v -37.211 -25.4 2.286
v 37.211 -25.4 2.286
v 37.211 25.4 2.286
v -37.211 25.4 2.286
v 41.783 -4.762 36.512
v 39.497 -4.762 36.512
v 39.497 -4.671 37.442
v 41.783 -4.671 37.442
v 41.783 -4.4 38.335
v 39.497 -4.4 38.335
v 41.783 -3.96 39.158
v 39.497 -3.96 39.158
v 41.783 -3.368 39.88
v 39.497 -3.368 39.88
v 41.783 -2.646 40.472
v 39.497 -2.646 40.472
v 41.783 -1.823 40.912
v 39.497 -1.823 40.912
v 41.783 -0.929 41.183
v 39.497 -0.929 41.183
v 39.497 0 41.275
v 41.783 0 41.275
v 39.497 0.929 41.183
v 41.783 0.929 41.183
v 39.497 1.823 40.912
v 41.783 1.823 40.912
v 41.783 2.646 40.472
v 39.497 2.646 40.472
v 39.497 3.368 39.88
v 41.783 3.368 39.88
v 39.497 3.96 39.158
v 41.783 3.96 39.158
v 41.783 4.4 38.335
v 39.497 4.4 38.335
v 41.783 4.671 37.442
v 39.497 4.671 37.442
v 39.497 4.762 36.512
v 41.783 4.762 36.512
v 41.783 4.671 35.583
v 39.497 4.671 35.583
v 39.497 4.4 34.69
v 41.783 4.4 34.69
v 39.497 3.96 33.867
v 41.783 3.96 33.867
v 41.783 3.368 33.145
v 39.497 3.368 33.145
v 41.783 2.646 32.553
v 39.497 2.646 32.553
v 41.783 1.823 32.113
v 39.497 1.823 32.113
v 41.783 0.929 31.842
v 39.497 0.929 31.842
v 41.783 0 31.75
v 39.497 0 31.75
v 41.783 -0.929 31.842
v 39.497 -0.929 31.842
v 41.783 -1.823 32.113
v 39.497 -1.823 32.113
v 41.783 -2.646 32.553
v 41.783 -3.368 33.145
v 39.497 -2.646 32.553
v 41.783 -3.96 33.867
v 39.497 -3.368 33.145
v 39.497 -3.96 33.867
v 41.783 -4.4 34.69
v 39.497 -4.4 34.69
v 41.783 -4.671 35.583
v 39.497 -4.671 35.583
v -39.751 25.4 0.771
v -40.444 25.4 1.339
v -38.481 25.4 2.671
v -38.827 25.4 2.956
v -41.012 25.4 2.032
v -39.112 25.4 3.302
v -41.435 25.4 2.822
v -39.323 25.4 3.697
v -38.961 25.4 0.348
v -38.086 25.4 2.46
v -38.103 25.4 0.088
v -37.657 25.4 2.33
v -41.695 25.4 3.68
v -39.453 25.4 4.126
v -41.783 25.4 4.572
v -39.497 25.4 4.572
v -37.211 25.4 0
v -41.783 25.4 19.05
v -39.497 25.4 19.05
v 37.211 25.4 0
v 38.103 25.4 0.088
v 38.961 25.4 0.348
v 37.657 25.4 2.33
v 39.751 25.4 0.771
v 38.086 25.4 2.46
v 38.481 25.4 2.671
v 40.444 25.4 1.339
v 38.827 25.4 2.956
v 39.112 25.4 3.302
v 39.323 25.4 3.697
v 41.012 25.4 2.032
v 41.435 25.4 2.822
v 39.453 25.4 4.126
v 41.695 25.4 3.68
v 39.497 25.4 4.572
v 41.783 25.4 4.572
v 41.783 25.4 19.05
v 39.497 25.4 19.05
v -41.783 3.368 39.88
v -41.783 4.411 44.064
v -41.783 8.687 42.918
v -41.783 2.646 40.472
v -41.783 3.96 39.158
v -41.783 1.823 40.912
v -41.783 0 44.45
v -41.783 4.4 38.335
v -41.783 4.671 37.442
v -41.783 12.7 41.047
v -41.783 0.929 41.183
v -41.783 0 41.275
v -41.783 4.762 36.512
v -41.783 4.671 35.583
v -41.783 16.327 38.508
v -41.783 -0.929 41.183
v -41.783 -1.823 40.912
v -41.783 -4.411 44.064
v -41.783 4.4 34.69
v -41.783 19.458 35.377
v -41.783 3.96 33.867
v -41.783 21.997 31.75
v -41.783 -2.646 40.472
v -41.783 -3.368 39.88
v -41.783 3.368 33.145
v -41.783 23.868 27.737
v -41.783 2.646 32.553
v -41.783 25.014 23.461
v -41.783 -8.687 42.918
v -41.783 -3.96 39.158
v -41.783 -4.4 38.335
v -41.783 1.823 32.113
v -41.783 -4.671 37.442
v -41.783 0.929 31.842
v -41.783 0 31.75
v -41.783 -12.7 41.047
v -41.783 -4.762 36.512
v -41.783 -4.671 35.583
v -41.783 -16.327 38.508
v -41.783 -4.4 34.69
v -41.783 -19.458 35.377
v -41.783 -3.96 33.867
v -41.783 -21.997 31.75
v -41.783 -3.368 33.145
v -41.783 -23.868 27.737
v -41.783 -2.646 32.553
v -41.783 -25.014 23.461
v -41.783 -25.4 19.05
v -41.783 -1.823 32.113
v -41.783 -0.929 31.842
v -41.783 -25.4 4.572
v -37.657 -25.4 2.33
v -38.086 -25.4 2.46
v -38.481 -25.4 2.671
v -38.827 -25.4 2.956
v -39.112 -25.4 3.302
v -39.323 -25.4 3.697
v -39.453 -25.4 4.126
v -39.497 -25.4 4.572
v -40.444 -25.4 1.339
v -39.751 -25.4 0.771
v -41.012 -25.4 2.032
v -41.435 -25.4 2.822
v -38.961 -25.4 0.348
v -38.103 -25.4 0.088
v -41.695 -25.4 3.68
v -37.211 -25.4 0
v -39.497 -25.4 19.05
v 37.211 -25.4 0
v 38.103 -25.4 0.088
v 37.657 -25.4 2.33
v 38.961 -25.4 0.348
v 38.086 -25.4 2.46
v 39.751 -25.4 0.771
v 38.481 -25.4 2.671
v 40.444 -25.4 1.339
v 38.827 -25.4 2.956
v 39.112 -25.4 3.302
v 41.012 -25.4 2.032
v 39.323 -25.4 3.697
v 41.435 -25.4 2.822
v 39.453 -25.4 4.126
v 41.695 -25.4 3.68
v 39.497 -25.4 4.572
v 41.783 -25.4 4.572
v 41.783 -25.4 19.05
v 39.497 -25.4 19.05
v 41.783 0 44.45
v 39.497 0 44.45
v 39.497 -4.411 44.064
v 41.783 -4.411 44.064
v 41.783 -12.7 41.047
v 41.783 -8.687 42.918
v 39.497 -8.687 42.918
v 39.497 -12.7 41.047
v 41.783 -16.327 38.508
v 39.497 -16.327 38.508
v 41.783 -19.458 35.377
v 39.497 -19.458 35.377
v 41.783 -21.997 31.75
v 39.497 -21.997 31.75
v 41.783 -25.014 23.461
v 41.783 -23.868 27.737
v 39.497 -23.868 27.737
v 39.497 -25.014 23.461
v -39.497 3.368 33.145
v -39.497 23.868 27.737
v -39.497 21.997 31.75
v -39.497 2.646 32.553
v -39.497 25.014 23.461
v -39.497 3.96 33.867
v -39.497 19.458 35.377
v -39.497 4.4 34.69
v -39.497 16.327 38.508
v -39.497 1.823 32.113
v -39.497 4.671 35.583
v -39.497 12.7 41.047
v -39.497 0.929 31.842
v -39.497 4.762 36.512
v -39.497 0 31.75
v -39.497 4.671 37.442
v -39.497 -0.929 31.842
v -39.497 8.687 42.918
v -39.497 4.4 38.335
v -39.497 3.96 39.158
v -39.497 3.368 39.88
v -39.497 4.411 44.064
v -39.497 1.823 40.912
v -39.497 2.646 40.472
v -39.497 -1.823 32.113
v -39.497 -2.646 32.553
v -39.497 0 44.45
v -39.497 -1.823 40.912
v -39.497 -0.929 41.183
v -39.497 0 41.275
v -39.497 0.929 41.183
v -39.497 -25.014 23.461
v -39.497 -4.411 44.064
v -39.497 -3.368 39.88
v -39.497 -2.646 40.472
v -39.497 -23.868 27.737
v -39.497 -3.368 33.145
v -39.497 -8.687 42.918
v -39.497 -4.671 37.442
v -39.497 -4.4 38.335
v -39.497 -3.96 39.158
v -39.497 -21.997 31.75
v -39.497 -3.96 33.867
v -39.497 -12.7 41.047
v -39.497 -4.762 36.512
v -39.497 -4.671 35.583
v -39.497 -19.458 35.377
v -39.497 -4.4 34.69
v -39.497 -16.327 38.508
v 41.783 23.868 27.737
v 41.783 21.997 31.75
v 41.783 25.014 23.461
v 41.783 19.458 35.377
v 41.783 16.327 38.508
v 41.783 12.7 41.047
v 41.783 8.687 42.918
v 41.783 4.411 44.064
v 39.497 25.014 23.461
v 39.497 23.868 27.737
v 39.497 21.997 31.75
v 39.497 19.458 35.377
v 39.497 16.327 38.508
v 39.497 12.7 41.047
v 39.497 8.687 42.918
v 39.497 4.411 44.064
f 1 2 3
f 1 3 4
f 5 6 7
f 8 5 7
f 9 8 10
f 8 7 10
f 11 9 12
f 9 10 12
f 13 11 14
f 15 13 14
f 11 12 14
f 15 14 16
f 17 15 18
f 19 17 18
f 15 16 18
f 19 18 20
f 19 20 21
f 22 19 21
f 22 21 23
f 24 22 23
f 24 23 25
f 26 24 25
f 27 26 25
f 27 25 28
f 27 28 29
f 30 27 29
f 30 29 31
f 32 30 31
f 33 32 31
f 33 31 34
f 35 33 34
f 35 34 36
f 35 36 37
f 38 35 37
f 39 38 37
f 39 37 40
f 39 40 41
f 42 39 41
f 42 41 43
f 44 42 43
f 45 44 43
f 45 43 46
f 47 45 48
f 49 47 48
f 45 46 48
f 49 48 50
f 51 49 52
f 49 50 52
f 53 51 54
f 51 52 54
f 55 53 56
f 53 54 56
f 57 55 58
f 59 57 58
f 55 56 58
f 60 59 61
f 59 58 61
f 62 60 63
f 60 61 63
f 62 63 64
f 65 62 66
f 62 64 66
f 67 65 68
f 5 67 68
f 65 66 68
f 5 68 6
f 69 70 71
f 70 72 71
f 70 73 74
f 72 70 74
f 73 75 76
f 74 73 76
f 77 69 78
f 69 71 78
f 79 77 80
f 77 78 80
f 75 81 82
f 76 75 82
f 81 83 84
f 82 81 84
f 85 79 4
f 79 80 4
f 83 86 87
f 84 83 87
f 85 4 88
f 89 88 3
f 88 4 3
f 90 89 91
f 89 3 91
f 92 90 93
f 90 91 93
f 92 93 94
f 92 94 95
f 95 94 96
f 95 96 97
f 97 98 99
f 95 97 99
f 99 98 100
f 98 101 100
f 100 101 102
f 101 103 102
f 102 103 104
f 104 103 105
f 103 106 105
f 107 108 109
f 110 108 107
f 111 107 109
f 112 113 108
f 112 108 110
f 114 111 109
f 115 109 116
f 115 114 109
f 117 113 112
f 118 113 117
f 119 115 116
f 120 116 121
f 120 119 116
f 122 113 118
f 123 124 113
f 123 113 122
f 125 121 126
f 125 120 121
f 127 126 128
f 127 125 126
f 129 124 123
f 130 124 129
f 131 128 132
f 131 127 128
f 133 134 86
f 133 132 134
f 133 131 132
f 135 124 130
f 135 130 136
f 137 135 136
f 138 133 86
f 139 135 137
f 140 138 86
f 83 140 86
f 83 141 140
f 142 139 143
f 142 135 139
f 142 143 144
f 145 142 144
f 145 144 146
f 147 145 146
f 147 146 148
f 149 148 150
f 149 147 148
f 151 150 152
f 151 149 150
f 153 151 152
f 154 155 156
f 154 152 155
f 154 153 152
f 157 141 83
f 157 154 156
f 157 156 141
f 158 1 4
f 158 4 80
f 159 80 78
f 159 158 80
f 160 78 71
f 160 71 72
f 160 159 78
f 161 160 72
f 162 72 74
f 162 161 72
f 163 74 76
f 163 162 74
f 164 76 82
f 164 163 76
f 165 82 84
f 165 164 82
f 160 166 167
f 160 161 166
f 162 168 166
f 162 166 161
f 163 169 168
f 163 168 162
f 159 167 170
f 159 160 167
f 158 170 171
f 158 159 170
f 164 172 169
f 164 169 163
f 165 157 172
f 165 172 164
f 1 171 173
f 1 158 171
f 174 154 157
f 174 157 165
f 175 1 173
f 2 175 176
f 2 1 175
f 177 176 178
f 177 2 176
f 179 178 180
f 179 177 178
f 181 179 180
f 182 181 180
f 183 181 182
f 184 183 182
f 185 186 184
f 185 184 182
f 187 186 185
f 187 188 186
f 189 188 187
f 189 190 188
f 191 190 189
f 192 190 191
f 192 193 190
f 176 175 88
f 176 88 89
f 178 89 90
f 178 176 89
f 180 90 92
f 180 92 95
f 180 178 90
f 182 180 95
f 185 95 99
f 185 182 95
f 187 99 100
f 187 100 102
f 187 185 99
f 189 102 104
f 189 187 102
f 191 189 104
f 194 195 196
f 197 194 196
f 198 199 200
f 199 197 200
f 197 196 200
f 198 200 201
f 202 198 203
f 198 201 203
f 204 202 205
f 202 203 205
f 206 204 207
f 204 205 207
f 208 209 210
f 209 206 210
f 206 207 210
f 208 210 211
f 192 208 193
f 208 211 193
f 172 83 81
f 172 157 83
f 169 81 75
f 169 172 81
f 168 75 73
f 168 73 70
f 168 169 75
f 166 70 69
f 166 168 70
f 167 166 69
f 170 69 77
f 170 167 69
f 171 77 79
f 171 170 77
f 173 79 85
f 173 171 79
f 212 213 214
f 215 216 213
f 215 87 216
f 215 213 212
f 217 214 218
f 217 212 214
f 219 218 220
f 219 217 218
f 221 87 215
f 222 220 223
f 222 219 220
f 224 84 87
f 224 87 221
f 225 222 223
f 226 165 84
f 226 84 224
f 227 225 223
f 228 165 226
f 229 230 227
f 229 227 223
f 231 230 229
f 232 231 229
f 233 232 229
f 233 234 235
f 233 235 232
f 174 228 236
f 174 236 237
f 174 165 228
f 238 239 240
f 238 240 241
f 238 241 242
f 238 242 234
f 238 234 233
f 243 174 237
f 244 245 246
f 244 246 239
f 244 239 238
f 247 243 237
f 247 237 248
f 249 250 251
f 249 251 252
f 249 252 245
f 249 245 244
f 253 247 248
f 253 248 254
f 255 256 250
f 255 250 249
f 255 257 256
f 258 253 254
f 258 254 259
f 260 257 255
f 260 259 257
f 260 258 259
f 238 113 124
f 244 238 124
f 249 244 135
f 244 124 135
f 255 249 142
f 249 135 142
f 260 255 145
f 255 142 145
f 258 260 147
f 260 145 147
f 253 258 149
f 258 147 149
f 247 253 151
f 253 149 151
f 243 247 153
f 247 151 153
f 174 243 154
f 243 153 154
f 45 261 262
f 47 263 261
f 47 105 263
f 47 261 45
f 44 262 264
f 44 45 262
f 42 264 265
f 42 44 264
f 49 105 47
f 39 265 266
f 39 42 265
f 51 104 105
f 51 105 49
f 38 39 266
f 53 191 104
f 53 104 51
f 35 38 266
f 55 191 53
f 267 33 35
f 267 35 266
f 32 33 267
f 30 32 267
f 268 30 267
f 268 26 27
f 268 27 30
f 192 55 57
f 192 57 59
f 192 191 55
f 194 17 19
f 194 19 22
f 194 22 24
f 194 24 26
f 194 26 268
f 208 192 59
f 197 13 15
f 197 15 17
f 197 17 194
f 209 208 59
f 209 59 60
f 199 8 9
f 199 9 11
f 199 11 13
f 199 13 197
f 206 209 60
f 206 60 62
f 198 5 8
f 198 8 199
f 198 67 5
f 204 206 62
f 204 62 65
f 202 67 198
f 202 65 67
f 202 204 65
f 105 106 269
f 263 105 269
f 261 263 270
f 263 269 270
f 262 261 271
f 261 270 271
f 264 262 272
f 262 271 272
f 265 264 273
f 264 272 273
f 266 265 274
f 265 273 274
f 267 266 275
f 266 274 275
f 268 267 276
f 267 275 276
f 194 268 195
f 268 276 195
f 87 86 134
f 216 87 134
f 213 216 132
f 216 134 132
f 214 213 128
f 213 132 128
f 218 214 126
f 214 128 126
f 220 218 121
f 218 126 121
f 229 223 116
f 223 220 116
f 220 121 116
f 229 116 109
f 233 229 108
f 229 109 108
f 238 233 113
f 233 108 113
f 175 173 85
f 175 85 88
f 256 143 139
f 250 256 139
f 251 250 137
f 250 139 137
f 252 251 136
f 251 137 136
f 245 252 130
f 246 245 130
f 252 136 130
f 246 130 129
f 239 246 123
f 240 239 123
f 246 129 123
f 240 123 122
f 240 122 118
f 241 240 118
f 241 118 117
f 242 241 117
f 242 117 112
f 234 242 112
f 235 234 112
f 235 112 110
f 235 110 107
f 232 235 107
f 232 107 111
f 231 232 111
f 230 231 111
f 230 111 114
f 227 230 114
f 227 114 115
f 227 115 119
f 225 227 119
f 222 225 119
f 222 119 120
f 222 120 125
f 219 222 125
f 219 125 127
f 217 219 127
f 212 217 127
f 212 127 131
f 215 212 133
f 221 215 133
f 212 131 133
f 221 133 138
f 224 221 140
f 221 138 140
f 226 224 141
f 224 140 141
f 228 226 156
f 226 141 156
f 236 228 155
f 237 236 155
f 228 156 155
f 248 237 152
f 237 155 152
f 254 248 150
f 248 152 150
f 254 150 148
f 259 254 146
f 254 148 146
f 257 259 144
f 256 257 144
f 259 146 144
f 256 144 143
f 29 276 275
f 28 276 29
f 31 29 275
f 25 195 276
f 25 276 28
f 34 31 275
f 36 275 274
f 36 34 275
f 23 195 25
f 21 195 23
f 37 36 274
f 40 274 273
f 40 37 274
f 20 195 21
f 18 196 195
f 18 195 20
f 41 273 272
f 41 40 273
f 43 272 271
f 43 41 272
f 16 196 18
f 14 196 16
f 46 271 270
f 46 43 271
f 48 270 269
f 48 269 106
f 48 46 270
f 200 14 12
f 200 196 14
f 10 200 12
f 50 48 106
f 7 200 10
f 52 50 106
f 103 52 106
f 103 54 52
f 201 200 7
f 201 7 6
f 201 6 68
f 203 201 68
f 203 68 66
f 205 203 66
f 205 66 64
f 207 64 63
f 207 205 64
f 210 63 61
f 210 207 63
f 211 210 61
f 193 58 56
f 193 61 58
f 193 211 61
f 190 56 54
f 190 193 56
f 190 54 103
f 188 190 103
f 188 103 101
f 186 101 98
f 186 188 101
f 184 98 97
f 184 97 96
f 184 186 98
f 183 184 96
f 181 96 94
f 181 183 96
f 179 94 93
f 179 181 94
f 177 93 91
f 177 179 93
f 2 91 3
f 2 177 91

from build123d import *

# Parameters (mm, degrees)
F1_DEPTH = 25.4
F2_R     = 4.7625
F3_DEPTH = 83.567


with BuildPart() as f1:
    # F0 (on Front) → F1 (new body, symmetric)
    with BuildSketch(Plane.XZ):
        with BuildLine():
            ThreePointArc((-41.783, 4.572), (-40.443892, 1.339108), (-37.211, 0))
            Line((-37.211, 0), (37.211, 0))
            ThreePointArc((37.211, 0), (40.443892, 1.339108), (41.783, 4.572))
            Line((41.783, 4.572), (41.783, 44.45))
            Line((41.783, 44.45), (39.497, 44.45))
            Line((39.497, 44.45), (39.497, 4.572))
            ThreePointArc((39.497, 4.572), (38.827446, 2.955554), (37.211, 2.286))
            Line((37.211, 2.286), (-37.211, 2.286))
            ThreePointArc((-37.211, 2.286), (-38.827446, 2.955554), (-39.497, 4.572))
            Line((-39.497, 4.572), (-39.497, 44.45))
            Line((-39.497, 44.45), (-41.783, 44.45))
            Line((-41.783, 44.45), (-41.783, 4.572))
        make_face()
    extrude(amount=F1_DEPTH, both=True)

    # F2 (on face) → F3 (cut, through all)
    with BuildSketch(Plane(origin=(-41.783, 0, 0), x_dir=(0, -1, 0), z_dir=(-1, 0, 0))):
        with BuildLine():
            ThreePointArc((-25.4, 19.05), (-17.960512, 37.010512), (0, 44.45))
            Line((0, 44.45), (-25.4, 44.45))
            Line((-25.4, 44.45), (-25.4, 19.05))
        make_face()
        with Locations((0, 36.5125)):
            Circle(F2_R)
        with BuildLine():
            ThreePointArc((0, 44.45), (17.960512, 37.010512), (25.4, 19.05))
            Line((25.4, 19.05), (25.4, 44.45))
            Line((25.4, 44.45), (0, 44.45))
        make_face()
    extrude(amount=-F3_DEPTH, mode=Mode.SUBTRACT)


solid = f1.part
